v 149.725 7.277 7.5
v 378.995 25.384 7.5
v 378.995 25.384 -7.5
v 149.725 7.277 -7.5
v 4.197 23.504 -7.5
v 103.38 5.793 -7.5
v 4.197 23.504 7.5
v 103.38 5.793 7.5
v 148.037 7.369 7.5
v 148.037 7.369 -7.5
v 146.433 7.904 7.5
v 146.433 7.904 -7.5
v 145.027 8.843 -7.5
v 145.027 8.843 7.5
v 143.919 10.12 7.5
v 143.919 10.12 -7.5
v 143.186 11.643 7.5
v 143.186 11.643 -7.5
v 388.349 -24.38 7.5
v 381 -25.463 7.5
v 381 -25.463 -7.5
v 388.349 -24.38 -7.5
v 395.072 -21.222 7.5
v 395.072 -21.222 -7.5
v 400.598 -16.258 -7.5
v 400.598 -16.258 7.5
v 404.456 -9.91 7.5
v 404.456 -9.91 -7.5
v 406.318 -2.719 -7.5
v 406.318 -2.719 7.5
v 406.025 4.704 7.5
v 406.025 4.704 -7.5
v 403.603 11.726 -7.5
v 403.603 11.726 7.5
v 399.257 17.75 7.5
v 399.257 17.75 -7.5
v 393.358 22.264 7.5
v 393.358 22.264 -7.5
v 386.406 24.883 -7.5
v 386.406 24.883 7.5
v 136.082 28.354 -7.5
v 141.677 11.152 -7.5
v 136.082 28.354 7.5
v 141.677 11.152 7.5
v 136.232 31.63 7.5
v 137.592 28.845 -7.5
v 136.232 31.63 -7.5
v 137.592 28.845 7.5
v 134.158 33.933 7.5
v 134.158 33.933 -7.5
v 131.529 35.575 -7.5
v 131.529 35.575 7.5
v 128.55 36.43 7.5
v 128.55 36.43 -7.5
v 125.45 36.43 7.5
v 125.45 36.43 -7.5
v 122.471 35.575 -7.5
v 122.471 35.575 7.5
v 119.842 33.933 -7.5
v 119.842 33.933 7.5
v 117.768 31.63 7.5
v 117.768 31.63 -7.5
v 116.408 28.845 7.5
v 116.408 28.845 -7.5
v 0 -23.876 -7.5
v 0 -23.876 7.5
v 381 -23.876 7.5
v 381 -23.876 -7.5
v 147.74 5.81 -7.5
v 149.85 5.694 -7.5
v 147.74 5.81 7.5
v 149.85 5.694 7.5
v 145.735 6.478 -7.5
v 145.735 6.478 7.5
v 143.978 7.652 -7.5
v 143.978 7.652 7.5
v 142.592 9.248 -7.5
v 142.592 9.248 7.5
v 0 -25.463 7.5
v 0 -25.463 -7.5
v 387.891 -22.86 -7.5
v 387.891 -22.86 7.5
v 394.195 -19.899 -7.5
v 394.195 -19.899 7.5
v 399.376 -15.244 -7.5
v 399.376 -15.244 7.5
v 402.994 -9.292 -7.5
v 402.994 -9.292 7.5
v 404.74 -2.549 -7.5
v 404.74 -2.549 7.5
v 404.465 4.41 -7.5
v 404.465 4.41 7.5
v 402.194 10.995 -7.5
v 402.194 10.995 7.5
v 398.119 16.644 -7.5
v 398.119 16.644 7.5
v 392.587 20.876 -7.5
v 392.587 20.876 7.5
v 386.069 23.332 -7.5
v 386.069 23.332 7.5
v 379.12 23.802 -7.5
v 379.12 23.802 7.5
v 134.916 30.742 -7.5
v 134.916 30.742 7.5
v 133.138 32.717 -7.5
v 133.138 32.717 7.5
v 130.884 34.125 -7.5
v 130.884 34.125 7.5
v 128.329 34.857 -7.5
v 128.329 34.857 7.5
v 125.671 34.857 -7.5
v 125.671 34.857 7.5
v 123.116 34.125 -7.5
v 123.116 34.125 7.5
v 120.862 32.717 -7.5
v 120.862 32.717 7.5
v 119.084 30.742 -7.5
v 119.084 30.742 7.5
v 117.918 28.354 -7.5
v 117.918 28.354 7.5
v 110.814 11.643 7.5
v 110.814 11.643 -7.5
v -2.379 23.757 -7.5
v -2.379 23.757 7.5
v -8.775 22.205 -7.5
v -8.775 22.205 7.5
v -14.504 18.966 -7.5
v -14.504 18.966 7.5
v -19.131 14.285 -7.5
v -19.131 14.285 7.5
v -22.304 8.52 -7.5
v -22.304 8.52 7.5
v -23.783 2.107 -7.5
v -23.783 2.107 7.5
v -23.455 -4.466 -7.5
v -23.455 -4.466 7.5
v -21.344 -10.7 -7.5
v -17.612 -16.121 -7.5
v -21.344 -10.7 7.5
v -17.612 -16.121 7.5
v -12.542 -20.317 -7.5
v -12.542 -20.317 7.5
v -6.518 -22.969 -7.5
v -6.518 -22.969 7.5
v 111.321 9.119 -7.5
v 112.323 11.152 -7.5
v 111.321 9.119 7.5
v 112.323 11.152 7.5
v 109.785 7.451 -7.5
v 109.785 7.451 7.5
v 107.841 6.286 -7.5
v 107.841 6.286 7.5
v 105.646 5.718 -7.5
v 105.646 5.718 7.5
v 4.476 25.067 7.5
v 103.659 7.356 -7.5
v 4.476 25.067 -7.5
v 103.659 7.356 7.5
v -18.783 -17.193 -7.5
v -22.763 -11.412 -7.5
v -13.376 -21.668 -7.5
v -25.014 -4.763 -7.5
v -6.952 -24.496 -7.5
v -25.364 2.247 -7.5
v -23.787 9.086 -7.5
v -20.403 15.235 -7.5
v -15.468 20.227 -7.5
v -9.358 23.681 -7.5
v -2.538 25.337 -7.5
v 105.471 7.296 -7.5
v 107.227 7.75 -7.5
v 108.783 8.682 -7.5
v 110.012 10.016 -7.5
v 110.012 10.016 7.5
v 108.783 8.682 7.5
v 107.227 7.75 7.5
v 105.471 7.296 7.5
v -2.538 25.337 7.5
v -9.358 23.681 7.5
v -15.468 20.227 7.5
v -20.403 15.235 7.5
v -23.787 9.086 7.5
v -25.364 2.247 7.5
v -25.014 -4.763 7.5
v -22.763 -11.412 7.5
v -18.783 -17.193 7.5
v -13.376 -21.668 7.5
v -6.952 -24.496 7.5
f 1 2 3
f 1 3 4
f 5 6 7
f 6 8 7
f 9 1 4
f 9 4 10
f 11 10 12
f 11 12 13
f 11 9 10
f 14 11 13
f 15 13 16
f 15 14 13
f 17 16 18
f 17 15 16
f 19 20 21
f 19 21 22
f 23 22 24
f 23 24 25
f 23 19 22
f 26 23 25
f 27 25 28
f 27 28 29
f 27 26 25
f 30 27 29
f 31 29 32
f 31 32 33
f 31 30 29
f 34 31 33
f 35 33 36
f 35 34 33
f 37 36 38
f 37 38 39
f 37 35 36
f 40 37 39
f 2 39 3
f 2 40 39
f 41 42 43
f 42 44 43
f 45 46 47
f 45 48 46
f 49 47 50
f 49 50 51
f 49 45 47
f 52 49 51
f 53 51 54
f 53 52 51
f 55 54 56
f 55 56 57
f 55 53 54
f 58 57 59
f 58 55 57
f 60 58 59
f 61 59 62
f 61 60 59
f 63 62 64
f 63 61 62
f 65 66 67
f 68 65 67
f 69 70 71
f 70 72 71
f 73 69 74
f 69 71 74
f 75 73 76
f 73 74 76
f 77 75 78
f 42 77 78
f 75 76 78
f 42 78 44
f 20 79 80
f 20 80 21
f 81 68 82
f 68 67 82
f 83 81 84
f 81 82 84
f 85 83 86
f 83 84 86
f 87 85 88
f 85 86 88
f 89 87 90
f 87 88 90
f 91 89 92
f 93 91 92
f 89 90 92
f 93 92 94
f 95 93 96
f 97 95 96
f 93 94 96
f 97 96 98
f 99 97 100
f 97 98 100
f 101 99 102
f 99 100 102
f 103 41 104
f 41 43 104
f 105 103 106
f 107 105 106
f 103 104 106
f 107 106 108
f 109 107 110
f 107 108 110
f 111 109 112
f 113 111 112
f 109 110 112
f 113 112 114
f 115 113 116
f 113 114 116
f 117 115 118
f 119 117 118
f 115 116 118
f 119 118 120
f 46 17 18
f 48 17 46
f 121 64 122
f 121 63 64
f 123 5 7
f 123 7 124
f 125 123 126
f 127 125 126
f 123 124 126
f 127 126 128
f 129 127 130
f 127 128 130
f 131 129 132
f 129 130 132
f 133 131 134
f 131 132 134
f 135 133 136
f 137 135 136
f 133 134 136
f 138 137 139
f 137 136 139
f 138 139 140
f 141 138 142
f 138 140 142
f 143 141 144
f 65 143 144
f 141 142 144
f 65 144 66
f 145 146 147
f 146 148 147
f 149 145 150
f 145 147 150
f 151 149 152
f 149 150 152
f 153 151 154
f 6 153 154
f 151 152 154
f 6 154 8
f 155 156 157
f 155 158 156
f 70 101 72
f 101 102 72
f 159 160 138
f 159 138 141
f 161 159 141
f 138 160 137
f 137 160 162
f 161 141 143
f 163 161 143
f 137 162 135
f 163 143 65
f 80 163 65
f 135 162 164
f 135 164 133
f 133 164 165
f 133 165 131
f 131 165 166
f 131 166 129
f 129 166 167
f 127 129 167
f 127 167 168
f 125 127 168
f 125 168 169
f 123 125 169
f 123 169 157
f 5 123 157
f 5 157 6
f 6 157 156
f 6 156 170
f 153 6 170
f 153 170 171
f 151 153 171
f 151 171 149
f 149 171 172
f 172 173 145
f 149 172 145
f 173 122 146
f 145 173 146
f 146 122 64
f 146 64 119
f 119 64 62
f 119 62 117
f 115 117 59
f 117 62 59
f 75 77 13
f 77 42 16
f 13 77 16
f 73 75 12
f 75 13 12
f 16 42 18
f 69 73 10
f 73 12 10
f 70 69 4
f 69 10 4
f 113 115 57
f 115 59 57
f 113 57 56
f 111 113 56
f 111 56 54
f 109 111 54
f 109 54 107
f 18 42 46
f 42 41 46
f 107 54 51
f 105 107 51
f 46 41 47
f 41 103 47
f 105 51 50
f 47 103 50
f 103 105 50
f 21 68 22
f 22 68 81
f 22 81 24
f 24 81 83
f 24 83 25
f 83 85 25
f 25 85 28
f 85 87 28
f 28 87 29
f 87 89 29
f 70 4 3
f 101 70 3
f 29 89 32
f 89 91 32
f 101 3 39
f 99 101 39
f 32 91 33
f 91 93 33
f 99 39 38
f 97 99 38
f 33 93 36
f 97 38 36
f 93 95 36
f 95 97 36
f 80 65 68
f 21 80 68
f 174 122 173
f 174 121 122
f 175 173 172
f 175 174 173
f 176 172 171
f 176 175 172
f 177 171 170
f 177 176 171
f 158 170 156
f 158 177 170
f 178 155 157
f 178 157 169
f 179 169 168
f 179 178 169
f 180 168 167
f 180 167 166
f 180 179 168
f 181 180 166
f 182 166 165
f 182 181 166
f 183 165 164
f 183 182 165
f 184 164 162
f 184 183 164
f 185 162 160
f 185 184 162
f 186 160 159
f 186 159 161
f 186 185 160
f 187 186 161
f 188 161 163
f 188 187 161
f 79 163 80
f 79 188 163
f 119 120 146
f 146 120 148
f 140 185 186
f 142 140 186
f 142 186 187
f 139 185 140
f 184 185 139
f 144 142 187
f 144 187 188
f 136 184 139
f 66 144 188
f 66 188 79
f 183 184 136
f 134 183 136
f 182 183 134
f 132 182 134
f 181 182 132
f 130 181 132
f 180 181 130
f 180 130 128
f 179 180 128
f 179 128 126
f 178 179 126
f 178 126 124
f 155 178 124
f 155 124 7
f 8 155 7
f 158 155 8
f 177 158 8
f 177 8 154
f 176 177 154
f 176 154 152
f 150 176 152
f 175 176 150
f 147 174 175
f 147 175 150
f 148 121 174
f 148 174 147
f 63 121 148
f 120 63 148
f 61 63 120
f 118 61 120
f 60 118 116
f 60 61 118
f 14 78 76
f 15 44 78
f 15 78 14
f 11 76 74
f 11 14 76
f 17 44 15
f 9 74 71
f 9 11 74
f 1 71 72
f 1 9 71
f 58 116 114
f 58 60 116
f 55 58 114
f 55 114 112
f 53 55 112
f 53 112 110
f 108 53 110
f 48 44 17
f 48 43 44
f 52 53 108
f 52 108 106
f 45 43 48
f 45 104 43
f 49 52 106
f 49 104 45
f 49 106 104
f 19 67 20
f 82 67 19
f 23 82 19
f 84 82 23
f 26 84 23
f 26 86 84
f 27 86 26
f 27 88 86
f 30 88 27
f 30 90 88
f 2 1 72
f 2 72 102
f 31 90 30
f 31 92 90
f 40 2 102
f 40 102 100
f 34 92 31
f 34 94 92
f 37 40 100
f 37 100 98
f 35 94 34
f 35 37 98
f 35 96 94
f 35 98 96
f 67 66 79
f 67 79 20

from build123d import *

# Parameters (mm, degrees)
BOSS_EXTRUDE1_DEPTH = 7.5


with BuildPart() as part:
    # Sketch1 → Boss-Extrude1 (new, symmetric)
    with BuildSketch(Plane.XY):
        with BuildLine():
            Line((103.658753776, 7.356207616), (4.476147359, 25.066988991))
            ThreePointArc((4.476147359, 25.066988991), (-25.364178544, 2.246837564), (0, -25.4635))
            Line((0, -25.4635), (381, -25.4635))
            ThreePointArc((381, -25.4635), (406.443730831, 1.003191728), (378.995174246, 25.384454021))
            Line((378.995174246, 25.384454021), (149.724956547, 7.277039279))
            ThreePointArc((149.724956547, 7.277039279), (145.698613571, 8.326503384), (143.18635498, 11.643334619))
            Line((143.18635498, 11.643334619), (137.591783364, 28.84484275))
            ThreePointArc((137.591783364, 28.84484275), (127, 36.5379), (116.408216636, 28.84484275))
            Line((116.408216636, 28.84484275), (110.81364502, 11.643334619))
            ThreePointArc((110.81364502, 11.643334619), (108.038796403, 8.16029732), (103.658753776, 7.356207616))
        make_face()
        with BuildLine():
            Line((0, -23.876), (381, -23.876))
            ThreePointArc((381, -23.876), (404.857463323, 0.940648602), (379.120163383, 23.801882075))
            Line((379.120163383, 23.801882075), (149.849945684, 5.694467333))
            ThreePointArc((149.849945684, 5.694467333), (144.817016963, 7.006297463), (141.676693726, 11.152336508))
            Line((141.676693726, 11.152336508), (136.082122109, 28.353844639))
            ThreePointArc((136.082122109, 28.353844639), (127, 34.9504), (117.917877891, 28.353844639))
            Line((117.917877891, 28.353844639), (112.323306274, 11.152336508))
            ThreePointArc((112.323306274, 11.152336508), (108.854745504, 6.798539884), (103.37969222, 5.793427754))
            Line((103.37969222, 5.793427754), (4.197085803, 23.504209129))
            ThreePointArc((4.197085803, 23.504209129), (-23.782870655, 2.106760409), (0, -23.876))
        make_face(mode=Mode.SUBTRACT)
    extrude(amount=BOSS_EXTRUDE1_DEPTH, both=True)


solid = part.part
